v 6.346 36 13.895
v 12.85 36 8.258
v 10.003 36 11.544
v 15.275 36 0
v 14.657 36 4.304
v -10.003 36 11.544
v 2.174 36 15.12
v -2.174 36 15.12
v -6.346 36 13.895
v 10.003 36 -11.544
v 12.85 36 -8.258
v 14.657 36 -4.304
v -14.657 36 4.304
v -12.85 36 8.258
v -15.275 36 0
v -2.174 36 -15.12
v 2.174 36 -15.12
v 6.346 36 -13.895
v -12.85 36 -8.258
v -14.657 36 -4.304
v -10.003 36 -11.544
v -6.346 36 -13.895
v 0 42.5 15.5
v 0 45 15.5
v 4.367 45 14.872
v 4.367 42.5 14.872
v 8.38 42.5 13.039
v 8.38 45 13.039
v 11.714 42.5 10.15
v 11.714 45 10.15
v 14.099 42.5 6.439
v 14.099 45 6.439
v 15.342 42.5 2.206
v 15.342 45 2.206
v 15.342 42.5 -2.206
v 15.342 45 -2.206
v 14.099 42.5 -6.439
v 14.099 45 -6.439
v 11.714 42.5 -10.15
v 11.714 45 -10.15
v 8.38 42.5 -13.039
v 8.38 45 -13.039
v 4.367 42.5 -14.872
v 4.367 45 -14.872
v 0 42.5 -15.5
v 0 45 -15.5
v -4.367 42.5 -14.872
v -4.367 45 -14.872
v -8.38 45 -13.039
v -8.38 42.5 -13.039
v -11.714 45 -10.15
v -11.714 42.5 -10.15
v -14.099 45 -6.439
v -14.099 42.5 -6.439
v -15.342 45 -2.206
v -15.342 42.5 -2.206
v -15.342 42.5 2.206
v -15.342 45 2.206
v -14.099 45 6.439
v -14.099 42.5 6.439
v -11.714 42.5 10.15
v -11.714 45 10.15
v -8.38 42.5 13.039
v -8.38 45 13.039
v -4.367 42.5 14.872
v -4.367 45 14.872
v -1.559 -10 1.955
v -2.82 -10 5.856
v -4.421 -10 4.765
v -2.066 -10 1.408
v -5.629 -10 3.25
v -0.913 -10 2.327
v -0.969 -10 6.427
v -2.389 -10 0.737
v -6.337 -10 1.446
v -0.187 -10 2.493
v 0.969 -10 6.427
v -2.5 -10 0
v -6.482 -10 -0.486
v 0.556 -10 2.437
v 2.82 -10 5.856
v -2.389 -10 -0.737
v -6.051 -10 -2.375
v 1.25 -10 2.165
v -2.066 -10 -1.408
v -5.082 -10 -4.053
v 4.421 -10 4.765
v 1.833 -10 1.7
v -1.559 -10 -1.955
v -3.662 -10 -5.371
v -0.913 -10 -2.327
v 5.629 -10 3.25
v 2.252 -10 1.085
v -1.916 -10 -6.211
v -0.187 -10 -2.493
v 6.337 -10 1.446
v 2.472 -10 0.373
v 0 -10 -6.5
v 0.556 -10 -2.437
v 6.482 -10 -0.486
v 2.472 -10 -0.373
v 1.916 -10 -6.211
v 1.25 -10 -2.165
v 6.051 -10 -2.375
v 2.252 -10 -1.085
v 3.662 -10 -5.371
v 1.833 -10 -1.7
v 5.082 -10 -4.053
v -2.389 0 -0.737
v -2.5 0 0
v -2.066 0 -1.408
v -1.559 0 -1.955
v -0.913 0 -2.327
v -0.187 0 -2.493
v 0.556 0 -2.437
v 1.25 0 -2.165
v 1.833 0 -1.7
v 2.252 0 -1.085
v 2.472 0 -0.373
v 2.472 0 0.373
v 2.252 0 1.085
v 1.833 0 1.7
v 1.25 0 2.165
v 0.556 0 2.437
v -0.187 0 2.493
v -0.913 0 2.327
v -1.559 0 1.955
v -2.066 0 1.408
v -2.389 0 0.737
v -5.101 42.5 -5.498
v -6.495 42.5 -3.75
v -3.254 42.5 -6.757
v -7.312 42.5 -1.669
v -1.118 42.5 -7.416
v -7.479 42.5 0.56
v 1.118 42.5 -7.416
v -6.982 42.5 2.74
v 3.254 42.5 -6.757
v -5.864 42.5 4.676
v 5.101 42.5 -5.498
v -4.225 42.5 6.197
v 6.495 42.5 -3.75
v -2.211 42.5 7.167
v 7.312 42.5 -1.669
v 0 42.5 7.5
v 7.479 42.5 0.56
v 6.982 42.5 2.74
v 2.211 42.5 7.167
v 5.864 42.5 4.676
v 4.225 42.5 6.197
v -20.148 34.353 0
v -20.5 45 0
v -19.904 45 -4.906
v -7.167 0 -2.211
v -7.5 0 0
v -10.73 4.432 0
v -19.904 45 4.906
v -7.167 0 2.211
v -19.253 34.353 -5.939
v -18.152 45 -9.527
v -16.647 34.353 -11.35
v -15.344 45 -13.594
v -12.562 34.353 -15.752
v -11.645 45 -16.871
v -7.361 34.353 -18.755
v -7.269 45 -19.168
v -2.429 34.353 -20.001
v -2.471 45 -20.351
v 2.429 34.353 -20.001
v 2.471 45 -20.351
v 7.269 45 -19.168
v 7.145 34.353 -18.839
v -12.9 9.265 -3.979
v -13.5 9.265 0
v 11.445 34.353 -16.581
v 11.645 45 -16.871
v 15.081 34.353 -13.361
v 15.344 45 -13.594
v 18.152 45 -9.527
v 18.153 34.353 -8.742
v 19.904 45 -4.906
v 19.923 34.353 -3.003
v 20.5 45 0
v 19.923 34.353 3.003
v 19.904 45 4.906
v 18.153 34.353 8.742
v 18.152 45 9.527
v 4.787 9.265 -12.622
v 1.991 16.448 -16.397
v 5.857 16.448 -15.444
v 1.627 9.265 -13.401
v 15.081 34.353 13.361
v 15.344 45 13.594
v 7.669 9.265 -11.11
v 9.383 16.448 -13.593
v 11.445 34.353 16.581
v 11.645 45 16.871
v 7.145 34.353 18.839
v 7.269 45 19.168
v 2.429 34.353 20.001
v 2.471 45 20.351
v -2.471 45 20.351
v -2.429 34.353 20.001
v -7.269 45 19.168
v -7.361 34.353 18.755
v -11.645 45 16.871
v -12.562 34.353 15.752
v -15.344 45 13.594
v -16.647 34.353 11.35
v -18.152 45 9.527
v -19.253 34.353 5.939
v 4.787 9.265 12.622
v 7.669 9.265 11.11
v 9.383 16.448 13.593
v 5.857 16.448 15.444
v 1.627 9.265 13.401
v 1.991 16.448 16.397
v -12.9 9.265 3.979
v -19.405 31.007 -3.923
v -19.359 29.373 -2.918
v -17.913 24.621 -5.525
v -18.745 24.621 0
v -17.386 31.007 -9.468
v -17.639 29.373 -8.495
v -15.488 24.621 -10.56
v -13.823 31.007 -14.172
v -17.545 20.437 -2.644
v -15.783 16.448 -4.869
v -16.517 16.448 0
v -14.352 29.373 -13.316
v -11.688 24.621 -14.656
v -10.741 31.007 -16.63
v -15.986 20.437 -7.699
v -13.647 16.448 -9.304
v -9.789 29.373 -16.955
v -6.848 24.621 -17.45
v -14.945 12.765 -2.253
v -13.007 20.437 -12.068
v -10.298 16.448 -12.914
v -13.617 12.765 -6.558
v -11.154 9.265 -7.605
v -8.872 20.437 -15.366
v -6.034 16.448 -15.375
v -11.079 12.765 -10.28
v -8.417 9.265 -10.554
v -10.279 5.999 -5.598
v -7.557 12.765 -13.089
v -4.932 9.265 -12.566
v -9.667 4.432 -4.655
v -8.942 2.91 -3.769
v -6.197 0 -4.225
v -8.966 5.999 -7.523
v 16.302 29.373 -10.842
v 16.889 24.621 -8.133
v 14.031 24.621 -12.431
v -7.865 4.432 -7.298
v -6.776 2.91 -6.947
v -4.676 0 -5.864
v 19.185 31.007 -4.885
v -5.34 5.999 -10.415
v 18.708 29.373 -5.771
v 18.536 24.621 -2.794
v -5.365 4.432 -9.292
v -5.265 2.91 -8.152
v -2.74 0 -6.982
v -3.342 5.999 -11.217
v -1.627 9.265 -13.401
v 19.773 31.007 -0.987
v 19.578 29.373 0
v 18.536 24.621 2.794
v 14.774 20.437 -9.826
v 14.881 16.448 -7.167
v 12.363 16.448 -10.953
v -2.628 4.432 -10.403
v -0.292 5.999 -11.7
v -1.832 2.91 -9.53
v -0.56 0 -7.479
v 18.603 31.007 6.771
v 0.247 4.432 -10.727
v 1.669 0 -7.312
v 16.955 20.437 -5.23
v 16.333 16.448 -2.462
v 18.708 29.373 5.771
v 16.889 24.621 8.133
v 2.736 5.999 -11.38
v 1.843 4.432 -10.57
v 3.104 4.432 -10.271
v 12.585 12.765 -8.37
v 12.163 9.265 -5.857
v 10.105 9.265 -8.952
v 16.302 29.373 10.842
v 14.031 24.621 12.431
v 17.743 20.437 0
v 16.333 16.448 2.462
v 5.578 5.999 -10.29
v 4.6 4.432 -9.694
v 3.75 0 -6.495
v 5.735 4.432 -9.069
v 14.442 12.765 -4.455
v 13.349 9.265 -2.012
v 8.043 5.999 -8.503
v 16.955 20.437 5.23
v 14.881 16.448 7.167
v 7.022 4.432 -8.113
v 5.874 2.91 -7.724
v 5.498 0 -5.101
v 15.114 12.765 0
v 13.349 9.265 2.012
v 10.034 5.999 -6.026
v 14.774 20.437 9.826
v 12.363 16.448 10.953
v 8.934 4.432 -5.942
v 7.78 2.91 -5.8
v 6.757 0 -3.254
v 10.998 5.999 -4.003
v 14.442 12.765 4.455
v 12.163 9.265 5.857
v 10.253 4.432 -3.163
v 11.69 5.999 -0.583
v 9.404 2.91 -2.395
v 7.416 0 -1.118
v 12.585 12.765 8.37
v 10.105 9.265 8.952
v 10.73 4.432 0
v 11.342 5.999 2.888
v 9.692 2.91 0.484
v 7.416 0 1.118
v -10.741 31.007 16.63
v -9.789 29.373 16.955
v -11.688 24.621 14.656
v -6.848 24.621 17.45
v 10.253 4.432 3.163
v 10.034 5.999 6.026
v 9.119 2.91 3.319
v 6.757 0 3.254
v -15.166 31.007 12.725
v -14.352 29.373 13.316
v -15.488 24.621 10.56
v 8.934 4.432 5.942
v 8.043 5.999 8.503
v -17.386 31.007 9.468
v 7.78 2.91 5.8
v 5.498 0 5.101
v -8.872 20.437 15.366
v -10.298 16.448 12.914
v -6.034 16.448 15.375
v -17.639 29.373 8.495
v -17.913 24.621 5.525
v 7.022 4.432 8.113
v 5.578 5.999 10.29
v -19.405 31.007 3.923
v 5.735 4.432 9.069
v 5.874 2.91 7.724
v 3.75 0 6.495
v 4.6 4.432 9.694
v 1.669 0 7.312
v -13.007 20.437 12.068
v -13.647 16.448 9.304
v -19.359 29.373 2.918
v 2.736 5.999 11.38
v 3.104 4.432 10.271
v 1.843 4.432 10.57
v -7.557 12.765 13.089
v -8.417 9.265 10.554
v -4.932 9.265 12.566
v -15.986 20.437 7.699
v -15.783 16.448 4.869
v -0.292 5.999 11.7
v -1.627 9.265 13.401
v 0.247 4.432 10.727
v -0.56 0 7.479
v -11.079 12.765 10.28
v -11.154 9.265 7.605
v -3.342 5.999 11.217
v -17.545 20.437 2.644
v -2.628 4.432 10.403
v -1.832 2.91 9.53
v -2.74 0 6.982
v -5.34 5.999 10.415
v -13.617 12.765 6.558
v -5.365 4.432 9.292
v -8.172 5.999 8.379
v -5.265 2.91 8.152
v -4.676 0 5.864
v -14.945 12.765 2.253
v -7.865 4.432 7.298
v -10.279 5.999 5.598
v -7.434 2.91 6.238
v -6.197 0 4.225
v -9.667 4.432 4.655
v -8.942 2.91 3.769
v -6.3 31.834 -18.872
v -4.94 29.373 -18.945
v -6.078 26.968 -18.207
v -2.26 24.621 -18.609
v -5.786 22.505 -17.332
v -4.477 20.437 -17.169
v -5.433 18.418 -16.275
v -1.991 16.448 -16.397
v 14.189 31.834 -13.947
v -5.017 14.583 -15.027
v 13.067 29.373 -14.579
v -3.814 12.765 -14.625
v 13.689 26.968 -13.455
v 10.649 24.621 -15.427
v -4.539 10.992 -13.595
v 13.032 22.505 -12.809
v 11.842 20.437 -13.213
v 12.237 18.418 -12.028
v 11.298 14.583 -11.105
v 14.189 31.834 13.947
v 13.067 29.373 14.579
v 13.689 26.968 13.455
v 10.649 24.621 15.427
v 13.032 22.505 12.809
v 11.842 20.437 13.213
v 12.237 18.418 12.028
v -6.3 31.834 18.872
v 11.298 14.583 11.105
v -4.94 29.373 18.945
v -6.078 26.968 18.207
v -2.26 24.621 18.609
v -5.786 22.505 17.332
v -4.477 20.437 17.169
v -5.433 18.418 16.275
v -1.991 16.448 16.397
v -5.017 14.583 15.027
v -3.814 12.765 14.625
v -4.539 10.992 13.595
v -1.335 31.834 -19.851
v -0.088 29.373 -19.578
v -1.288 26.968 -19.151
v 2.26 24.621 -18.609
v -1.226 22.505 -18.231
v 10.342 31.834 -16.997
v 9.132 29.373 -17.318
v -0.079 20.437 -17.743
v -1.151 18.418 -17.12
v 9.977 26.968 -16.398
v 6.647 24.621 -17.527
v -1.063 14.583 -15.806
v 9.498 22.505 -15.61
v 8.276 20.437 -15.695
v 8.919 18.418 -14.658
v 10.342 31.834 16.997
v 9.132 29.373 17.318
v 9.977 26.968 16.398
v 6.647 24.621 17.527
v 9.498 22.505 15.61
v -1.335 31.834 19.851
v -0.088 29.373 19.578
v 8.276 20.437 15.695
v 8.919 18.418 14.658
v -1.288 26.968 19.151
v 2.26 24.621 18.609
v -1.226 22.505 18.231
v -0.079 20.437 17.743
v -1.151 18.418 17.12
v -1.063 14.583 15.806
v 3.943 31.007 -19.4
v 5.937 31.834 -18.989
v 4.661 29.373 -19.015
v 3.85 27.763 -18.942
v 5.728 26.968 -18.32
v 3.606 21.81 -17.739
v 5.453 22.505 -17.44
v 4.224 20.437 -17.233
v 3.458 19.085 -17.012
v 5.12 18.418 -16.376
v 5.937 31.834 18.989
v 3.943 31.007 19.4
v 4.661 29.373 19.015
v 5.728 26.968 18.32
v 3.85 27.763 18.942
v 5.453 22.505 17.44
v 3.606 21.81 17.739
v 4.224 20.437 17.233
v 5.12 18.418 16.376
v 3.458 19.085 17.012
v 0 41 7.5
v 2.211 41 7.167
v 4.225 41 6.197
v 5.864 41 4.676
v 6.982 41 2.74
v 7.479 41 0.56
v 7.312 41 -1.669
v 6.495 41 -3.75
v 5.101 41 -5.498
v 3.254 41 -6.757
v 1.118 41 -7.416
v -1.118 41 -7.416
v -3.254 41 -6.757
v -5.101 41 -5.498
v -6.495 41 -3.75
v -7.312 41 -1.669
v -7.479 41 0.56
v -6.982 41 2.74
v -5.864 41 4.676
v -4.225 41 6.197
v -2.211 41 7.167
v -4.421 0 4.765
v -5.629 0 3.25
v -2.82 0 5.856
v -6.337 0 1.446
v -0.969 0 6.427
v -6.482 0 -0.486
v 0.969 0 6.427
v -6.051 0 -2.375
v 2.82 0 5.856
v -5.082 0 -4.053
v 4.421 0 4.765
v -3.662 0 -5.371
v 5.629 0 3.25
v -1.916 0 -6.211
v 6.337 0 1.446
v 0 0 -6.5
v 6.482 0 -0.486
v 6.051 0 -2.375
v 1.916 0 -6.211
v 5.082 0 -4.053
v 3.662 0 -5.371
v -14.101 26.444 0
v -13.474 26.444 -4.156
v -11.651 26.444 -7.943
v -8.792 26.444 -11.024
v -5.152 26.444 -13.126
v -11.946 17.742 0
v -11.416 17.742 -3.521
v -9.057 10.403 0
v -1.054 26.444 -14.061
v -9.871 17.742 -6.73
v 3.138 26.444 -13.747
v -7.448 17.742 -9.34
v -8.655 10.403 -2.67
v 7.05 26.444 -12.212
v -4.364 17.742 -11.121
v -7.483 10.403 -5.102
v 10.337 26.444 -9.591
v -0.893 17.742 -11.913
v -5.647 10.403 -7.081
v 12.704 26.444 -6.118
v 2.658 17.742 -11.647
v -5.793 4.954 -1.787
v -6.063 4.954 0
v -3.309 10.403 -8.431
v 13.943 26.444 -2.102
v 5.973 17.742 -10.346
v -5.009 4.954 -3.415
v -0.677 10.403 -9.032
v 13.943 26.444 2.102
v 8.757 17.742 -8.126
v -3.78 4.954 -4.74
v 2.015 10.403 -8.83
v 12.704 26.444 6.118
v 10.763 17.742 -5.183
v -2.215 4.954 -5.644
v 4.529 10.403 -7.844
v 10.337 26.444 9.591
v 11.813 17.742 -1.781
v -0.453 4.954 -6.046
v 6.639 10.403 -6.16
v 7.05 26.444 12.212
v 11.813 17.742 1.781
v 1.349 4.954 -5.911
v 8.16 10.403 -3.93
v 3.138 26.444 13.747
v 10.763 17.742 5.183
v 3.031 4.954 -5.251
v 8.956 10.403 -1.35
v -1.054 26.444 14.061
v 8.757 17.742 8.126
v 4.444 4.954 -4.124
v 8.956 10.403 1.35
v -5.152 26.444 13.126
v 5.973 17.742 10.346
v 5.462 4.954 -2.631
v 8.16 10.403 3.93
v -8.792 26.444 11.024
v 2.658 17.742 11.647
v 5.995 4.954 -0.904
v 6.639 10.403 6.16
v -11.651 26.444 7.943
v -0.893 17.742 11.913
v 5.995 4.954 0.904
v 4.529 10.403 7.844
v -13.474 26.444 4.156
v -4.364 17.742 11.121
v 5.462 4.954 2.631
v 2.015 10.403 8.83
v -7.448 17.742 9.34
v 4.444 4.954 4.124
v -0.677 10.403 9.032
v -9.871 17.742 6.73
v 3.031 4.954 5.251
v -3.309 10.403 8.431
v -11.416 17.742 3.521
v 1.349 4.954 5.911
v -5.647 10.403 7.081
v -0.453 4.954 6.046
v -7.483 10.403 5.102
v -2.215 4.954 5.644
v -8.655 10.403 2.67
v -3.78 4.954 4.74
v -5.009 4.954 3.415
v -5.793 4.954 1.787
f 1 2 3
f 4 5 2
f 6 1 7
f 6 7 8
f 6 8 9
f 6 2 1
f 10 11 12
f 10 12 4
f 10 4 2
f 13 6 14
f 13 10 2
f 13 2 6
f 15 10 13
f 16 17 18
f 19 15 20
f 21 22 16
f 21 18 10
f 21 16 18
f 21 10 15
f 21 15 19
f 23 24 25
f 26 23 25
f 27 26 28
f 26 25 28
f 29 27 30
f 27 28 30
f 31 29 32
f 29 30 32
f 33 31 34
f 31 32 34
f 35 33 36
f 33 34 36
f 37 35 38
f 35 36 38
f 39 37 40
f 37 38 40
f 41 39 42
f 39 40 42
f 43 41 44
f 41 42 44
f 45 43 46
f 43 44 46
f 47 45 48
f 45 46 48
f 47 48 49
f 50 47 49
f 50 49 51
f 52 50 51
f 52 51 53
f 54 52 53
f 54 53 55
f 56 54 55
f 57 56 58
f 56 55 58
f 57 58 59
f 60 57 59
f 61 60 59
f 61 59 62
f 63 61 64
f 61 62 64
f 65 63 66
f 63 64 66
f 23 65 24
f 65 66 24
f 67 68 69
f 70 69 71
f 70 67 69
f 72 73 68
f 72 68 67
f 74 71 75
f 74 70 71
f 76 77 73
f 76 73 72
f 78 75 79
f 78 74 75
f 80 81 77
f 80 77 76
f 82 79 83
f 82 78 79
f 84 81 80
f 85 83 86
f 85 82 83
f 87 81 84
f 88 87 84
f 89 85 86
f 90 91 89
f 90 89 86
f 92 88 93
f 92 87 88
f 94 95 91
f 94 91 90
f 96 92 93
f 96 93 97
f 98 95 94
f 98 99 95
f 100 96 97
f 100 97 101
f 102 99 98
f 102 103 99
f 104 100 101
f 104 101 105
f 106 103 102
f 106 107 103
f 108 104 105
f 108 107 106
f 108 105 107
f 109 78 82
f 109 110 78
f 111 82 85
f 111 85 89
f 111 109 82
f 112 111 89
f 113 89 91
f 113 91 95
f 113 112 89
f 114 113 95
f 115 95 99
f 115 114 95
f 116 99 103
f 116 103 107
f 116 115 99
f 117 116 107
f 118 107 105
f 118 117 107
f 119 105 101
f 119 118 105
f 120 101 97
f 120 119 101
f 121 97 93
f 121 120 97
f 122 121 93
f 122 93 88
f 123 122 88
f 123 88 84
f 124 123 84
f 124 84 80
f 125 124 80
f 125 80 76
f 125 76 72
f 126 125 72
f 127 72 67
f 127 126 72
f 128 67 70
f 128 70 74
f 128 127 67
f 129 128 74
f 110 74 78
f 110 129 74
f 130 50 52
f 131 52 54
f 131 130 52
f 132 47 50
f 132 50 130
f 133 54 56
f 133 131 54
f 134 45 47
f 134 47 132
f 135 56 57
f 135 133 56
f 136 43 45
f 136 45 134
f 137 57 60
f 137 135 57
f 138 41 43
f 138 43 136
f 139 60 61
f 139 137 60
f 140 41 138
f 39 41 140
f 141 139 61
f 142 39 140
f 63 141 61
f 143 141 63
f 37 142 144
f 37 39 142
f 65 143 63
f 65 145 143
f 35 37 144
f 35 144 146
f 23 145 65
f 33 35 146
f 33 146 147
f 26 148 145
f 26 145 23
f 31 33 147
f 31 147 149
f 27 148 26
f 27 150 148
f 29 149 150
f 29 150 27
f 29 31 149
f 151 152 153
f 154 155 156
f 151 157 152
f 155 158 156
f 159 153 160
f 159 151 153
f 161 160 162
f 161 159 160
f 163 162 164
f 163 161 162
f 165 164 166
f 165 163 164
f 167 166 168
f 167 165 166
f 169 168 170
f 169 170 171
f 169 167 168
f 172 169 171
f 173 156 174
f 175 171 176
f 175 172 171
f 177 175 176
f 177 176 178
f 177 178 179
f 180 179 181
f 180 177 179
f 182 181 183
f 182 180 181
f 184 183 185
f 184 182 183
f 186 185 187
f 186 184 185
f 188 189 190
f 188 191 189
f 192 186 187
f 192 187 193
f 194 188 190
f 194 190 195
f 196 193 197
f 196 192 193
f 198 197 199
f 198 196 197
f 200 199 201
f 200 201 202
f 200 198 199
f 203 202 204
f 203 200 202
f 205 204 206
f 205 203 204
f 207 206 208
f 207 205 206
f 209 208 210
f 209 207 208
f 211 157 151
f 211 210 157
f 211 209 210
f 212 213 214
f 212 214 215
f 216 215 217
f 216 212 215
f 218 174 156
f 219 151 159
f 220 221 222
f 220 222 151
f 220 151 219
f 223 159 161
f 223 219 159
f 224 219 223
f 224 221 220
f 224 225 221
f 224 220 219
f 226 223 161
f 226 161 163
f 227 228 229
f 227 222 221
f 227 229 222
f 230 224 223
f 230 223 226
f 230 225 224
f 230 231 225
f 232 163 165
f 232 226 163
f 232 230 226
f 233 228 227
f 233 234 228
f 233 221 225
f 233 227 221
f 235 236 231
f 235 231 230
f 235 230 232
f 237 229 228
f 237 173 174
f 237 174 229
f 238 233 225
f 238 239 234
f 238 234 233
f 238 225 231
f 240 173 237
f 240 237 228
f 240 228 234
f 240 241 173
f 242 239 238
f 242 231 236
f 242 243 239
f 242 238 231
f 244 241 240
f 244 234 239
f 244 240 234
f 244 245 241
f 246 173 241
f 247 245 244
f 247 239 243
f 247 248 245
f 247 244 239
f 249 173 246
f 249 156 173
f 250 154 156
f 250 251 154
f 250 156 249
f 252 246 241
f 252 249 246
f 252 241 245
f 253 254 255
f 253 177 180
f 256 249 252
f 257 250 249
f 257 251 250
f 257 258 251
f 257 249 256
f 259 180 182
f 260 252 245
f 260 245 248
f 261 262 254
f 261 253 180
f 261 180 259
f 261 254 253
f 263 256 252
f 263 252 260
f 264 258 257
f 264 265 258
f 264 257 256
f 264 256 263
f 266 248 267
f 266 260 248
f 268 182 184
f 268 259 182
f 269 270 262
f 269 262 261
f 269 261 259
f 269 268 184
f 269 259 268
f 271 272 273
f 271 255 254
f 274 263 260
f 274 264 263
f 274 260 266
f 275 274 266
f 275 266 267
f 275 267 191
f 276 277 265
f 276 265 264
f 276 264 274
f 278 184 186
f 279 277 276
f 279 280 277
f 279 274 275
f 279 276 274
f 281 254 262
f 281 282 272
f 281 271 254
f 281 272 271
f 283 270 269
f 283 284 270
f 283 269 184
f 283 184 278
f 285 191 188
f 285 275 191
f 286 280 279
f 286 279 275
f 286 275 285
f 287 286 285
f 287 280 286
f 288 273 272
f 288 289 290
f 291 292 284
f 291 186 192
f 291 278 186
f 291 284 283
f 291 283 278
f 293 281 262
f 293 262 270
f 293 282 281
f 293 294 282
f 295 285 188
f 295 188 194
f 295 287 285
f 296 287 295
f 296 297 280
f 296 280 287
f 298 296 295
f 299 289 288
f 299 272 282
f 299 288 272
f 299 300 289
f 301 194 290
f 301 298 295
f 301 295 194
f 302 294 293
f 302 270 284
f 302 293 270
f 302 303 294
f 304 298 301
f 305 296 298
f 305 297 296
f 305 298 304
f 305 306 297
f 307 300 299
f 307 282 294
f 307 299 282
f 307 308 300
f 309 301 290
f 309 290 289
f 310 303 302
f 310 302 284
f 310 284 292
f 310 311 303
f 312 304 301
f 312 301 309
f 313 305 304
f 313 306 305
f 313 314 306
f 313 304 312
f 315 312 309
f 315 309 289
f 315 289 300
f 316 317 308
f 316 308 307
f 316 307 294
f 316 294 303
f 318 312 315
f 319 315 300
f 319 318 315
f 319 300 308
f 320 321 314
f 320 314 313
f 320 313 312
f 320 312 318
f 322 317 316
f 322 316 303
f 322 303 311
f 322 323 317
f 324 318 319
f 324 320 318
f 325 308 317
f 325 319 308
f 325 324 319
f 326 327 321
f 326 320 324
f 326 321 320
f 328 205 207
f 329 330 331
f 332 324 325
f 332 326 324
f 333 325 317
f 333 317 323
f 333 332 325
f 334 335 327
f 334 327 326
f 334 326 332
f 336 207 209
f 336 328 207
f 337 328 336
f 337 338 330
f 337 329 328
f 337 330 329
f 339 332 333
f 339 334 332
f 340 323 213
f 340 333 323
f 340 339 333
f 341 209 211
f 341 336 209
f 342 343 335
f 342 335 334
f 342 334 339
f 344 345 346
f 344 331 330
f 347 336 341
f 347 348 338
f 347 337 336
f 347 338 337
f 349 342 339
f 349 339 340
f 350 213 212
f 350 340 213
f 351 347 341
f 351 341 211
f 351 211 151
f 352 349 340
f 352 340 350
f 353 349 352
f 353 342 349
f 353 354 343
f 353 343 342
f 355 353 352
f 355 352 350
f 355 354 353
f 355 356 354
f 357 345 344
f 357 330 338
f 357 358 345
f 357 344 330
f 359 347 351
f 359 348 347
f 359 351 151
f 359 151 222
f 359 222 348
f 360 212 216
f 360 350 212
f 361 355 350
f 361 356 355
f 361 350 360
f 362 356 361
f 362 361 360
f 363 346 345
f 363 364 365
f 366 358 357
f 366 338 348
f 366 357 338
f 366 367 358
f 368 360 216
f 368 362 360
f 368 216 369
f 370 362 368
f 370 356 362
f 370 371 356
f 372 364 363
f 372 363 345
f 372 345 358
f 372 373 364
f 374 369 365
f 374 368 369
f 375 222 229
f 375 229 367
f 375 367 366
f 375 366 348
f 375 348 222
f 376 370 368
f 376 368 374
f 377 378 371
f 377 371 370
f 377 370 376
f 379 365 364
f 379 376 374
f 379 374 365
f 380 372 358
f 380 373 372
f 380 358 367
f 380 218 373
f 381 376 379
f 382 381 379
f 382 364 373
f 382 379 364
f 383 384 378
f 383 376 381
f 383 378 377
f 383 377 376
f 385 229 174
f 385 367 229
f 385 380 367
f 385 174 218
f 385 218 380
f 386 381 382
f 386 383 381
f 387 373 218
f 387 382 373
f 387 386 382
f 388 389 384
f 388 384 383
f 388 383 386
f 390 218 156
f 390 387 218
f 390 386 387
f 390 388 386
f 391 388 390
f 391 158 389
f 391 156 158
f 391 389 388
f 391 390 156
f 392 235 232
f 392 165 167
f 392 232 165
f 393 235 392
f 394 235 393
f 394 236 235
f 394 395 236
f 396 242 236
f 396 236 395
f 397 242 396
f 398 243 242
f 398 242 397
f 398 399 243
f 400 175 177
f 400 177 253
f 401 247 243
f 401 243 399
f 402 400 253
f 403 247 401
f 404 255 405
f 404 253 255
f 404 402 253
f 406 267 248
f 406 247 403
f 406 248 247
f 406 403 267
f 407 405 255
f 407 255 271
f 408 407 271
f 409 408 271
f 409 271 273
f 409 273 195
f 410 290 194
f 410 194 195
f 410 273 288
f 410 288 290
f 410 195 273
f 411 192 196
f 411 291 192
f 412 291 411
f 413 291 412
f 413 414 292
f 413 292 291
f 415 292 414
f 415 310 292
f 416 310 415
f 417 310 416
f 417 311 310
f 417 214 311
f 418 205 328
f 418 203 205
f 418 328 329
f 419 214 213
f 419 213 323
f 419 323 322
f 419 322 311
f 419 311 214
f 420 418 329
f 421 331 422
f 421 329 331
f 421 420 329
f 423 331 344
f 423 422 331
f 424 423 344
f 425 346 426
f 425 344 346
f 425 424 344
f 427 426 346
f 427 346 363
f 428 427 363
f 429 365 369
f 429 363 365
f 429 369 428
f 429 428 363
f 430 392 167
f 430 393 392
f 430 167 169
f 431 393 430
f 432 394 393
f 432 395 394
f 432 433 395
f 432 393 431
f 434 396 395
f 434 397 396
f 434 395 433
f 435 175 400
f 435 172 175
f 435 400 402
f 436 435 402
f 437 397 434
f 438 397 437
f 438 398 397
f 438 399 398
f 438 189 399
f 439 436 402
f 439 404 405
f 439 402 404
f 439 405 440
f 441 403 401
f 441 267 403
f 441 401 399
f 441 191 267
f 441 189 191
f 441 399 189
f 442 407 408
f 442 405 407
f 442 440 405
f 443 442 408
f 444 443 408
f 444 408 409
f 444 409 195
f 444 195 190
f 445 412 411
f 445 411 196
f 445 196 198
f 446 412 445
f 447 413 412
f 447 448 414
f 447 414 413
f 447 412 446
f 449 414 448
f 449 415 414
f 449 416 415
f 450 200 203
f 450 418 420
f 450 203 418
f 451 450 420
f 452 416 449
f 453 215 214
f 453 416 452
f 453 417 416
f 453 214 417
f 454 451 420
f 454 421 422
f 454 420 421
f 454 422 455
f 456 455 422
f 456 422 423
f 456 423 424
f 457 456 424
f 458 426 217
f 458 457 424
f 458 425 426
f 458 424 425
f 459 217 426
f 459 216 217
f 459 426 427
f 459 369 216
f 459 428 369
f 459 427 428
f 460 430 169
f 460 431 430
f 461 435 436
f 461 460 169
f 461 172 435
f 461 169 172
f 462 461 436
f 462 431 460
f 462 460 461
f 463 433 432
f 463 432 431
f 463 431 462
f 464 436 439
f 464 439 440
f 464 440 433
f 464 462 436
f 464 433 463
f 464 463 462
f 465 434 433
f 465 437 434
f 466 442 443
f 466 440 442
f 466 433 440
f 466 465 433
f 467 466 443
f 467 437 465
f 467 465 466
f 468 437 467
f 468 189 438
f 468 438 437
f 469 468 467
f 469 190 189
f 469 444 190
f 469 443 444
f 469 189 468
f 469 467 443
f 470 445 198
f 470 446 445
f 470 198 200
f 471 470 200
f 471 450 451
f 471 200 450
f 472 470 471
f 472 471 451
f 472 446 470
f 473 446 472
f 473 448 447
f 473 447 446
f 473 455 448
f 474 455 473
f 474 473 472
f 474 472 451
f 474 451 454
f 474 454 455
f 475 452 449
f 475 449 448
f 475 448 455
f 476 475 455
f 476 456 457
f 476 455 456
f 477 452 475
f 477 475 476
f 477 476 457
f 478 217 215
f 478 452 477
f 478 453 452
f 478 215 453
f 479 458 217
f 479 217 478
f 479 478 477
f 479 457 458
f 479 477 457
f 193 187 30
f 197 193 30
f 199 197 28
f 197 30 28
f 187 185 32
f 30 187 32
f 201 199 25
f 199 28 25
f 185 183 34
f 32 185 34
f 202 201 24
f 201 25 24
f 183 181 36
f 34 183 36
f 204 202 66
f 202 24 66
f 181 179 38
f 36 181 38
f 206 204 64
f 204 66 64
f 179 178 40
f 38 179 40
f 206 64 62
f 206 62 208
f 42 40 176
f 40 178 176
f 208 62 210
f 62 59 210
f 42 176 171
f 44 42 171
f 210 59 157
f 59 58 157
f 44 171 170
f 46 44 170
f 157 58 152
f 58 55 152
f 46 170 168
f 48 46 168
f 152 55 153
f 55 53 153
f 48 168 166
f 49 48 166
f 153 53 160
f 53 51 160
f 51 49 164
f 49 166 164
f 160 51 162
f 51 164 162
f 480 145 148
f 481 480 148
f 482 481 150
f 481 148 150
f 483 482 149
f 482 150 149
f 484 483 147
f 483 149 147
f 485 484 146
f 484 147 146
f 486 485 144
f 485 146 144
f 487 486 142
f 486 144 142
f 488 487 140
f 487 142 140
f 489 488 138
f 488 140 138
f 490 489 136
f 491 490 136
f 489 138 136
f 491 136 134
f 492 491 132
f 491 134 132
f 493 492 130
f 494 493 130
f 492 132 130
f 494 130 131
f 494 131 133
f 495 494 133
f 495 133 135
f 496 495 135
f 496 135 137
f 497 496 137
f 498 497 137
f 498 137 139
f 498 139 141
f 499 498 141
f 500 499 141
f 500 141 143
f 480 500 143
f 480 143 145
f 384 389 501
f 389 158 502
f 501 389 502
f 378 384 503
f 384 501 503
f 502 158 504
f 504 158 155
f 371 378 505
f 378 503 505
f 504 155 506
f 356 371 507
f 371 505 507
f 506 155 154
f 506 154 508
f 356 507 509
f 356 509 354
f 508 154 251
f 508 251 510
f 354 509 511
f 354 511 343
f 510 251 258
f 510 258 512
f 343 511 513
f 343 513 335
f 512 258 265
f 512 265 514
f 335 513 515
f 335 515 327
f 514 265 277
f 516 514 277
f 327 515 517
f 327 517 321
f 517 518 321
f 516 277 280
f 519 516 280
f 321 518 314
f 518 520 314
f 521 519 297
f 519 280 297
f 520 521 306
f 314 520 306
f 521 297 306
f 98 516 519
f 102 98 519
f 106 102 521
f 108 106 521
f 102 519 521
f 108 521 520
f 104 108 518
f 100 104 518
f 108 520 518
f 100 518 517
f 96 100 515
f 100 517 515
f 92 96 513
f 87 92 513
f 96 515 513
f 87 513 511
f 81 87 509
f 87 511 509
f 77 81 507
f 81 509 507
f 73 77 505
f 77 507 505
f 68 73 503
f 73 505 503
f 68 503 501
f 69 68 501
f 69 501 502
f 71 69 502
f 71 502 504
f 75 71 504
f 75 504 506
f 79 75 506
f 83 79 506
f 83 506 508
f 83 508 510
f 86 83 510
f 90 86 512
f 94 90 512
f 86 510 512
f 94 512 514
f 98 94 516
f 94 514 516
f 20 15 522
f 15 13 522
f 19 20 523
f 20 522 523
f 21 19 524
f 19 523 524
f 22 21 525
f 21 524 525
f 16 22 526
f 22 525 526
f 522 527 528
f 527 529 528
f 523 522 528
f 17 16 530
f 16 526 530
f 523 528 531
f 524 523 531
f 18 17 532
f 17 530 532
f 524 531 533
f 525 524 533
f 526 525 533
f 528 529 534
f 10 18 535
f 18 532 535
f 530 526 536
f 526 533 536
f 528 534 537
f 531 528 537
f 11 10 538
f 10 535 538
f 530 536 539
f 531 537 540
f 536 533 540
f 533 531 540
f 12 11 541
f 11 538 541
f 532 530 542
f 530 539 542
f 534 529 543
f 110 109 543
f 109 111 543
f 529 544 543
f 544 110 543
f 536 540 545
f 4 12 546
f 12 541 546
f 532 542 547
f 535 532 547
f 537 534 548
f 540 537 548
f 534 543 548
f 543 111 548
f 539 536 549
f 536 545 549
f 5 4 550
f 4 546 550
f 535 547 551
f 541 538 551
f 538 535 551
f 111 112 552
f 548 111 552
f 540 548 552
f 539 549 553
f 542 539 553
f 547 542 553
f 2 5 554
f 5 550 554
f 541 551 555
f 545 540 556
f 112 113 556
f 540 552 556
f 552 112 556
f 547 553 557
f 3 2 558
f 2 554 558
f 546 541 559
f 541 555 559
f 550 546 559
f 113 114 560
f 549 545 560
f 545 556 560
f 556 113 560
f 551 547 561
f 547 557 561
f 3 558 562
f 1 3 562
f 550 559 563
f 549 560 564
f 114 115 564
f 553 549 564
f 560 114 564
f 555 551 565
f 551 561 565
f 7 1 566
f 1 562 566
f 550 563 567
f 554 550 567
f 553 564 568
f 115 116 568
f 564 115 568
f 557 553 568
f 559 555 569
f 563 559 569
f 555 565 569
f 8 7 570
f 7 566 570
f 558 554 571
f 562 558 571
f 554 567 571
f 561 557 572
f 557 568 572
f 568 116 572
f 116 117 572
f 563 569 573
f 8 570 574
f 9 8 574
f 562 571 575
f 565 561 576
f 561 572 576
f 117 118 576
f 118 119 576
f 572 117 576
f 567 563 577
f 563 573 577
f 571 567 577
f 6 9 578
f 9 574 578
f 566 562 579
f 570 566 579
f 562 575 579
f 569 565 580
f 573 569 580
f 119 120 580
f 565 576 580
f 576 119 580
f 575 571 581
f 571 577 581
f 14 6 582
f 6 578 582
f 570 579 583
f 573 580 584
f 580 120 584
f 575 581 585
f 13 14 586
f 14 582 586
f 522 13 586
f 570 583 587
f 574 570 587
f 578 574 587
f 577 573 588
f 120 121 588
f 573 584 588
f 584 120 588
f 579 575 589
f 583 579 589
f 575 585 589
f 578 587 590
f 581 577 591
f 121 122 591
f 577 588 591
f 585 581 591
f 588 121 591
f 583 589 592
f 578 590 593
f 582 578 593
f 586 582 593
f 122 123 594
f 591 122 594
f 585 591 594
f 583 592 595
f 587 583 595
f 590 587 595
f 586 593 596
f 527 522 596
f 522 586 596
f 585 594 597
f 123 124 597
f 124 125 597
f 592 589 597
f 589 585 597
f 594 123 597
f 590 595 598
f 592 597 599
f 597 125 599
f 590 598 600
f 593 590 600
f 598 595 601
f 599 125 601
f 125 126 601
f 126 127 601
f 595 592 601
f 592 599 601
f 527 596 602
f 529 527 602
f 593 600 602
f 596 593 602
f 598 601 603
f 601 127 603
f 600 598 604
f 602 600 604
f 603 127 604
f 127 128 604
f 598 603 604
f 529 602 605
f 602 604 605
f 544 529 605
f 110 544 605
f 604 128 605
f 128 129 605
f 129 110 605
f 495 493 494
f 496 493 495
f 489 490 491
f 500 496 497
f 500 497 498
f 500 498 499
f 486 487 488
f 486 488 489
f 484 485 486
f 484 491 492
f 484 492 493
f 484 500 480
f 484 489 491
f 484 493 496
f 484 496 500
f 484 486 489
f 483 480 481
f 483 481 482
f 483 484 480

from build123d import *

# Parameters (mm, degrees)
SKETCH2_R           = 15.5
CUT_EXTRUDE1_DEPTH  = 2.5
SKETCH3_R           = 7.5
CUT_EXTRUDE2_DEPTH  = 4
SKETCH4_R           = 6.5
BOSS_EXTRUDE1_DEPTH = 10


with BuildPart() as part:
    # Sketch1 → Revolve1 (revolve)
    with BuildSketch(Plane.XY):
        with BuildLine():
            Line((0, 45), (0, 0))
            Line((0, 0), (-7.5, 0))
            add(Edge.make_bspline(
                [(-20.5, 45), (-20.945482832, 16.446098589), (-7.5, 0)],
                knots=[0, 0, 0, 0.557031676, 0.557031676, 0.557031676], degree=2))
            Line((-20.5, 45), (0, 45))
        make_face()
    revolve(axis=Axis((0, 45, 0), (0, -1, 0)))

    # Sketch2 → Cut-Extrude1 (cut)
    with BuildSketch(Plane(origin=(0, 45, 0), x_dir=(1, 0, 0), z_dir=(0, 1, 0))):
        with Locations(Location((0, 0, 0), (0, 0, 270))):
            Circle(SKETCH2_R)
    extrude(amount=-CUT_EXTRUDE1_DEPTH, mode=Mode.SUBTRACT)

    # Sketch3 → Cut-Extrude2 (cut)
    with BuildSketch(Plane(origin=(0, 45, 0), x_dir=(1, 0, 0), z_dir=(0, 1, 0))):
        with Locations(Location((0, 0, 0), (0, 0, 270))):
            Circle(SKETCH3_R)
    extrude(amount=-CUT_EXTRUDE2_DEPTH, mode=Mode.SUBTRACT)

    # Sketch4 → Boss-Extrude1 (add)
    with BuildSketch(Plane.XZ):
        with Locations(Location((0, 0, 0), (0, 0, 270))):
            Circle(SKETCH4_R)
    extrude(amount=BOSS_EXTRUDE1_DEPTH)

    # Sketch6 → Cut-Revolve1 (revolve, cut)
    with BuildSketch(Plane.XY):
        with BuildLine():
            Line((0, 36), (0, 0))
            Line((0, 0), (0, -10))
            Line((0, -10), (-2.5, -10))
            Line((-2.5, -10), (-2.5, 0))
            add(Edge.make_bspline(
                [(-15.275259687, 36), (-14.25878691, 21.174216867), (-10.000367015, 9.174216867), (-2.5, 0)],
                knots=[0.09093365, 0.09093365, 0.09093365, 0.09093365, 0.557031676, 0.557031676, 0.557031676, 0.557031676], degree=3))
            Line((-15.275259687, 36), (0, 36))
        make_face()
    revolve(axis=Axis((0, 36, 0), (0, -1, 0)), mode=Mode.SUBTRACT)


solid = part.part
